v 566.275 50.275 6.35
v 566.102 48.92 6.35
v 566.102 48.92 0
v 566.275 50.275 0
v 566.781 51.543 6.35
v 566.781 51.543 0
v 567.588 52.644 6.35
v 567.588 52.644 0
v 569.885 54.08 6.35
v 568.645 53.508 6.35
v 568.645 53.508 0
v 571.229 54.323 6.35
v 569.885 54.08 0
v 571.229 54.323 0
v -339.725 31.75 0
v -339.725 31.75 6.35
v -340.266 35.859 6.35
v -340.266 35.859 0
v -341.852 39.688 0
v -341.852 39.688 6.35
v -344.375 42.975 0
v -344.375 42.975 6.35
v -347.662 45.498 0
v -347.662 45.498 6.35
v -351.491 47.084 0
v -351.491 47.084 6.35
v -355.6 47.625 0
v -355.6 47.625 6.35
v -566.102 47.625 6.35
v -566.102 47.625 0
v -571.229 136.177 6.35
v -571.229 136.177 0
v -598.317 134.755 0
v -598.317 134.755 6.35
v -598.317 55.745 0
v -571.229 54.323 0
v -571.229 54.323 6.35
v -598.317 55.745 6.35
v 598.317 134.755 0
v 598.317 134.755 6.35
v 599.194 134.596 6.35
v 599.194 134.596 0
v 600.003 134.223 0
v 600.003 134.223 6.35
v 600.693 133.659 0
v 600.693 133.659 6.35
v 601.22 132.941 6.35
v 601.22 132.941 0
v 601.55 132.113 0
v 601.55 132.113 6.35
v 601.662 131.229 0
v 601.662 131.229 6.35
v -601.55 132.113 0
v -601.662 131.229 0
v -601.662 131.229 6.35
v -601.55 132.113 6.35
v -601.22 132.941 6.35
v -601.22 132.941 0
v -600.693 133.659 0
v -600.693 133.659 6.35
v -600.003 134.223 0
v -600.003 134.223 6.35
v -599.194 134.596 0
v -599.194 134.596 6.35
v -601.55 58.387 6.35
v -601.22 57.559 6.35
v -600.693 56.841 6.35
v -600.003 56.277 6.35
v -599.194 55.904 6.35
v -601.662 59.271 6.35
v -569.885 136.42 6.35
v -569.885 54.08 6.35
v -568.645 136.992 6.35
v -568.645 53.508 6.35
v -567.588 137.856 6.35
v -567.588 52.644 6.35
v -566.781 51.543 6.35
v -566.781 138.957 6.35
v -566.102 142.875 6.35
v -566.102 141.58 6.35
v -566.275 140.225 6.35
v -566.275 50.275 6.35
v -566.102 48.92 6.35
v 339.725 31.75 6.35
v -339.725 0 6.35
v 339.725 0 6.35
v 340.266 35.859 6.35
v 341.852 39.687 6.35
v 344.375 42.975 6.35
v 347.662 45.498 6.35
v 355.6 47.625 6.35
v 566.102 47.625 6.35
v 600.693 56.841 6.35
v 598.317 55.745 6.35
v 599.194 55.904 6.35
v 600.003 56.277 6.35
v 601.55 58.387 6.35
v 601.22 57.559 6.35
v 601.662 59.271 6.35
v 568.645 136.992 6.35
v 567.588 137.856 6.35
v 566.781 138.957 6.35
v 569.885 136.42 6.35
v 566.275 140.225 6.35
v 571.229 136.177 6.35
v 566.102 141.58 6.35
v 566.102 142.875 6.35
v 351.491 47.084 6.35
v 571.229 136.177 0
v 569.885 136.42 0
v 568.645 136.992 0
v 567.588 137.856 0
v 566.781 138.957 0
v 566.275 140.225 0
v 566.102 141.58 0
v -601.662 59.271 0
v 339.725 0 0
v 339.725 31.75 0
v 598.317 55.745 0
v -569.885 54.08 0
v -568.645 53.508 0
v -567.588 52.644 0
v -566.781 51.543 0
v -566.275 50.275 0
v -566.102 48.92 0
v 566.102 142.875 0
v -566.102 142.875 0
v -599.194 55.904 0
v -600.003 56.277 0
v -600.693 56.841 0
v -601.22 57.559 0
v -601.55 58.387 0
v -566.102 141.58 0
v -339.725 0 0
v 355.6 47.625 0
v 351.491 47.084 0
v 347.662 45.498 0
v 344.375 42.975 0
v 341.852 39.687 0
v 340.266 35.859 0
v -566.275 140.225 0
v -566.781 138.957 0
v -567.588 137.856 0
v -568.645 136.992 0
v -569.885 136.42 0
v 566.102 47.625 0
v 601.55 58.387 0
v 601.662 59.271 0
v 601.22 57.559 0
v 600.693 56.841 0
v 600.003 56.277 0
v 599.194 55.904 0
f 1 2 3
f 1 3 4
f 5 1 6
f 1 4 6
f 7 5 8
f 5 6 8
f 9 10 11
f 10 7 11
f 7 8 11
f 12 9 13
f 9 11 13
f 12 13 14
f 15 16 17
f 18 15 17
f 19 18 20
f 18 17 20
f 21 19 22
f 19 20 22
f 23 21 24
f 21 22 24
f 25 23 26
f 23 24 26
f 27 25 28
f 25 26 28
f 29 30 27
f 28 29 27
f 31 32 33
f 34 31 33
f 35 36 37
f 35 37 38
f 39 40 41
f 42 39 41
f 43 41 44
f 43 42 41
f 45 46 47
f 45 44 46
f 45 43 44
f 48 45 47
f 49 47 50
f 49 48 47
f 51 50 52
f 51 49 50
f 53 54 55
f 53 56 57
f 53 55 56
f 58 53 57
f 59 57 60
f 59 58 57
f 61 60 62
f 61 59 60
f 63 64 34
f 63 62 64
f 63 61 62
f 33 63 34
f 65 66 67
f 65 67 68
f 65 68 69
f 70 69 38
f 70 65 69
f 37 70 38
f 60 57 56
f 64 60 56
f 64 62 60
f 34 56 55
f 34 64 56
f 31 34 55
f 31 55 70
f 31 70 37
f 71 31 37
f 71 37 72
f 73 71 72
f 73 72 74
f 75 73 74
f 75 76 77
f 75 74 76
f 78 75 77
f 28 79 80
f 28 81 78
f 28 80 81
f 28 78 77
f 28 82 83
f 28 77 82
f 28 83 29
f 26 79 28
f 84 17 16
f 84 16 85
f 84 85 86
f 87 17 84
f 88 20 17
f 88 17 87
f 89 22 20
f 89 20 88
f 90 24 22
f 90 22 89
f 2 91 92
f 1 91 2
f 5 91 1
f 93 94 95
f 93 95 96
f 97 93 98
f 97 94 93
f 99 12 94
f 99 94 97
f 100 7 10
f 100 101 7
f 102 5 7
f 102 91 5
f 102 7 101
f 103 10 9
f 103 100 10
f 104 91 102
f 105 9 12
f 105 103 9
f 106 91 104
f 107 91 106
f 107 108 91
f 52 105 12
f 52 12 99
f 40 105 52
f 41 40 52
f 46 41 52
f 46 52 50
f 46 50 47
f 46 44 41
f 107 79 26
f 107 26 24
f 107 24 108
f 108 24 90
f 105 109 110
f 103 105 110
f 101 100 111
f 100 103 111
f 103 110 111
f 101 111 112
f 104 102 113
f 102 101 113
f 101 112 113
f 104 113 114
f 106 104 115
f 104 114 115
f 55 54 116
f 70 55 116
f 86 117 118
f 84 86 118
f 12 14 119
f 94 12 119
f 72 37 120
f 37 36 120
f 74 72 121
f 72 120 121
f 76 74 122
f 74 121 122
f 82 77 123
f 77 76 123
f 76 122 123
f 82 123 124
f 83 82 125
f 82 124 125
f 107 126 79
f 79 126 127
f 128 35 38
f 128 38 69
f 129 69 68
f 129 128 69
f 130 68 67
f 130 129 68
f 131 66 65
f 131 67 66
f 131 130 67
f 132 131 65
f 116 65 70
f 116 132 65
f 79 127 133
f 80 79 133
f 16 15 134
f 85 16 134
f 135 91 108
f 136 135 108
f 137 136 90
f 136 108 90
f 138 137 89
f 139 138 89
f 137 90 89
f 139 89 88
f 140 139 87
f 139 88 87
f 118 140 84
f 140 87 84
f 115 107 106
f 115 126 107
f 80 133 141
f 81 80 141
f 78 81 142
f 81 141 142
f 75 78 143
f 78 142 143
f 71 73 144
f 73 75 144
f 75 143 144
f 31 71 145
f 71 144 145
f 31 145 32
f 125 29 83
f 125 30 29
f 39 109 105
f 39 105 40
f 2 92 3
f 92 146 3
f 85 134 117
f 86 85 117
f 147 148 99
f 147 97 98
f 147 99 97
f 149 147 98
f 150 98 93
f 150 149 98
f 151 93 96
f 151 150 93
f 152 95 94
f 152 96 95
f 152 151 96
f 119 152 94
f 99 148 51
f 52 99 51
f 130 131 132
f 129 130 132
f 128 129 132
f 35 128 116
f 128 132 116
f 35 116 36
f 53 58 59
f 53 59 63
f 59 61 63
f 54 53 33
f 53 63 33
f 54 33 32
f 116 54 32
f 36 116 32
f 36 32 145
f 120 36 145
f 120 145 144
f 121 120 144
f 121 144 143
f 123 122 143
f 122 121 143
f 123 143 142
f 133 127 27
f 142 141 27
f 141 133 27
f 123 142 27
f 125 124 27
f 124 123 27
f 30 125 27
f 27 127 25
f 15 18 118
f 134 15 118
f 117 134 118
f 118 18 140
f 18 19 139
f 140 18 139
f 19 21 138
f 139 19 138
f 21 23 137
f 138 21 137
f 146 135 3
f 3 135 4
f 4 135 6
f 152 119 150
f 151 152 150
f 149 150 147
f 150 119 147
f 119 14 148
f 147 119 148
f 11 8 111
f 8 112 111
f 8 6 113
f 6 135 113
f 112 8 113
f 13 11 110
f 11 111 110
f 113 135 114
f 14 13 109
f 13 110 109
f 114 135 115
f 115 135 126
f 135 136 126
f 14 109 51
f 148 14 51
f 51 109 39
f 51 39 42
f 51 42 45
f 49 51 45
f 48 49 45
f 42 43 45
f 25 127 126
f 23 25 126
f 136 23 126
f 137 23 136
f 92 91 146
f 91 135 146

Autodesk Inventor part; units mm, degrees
ref_plane "YZ Plane" through (0, 0, 0) normal (1, 0, 0) x (0, 1, 0)
ref_plane "XZ Plane" through (0, 0, 0) normal (0, 1, 0) x (-1, 0, 0)
ref_plane "XY Plane" through (0, 0, 0) normal (0, 0, 1) x (1, 0, 0)
sketch "Sketch1" plane through (0, 0, 0) normal (0, 0, 1) x (1, 0, 0)
  line L0 (-339.725, 0) -> (339.725, 0)
  line L1 (339.725, 0) -> (339.725, 47.625)
  line L2 (339.725, 47.625) -> (566.1025, 47.625)
  line L3 (601.6625, 59.2709) -> (601.6625, 131.2291)
  line L4 (566.1025, 142.875) -> (-566.1025, 142.875)
  line L5 (-601.6625, 131.2291) -> (-601.6625, 59.2709)
  line L6 (-566.1025, 47.625) -> (-339.725, 47.625)
  line L7 (-339.725, 47.625) -> (-339.725, 0)
  line L8 (566.1025, 47.625) -> (566.1025, 48.9204)
  arc A0 (571.2291, 54.3232) -> (566.1025, 48.9204) centre (571.5127, 48.9204) ccw
  line L9 (571.2291, 54.3232) -> (598.317, 55.7452)
  arc A1 (598.317, 55.7452) -> (601.6625, 59.2709) centre (598.1319, 59.2709) ccw
  line L10 (566.1025, 142.875) -> (566.1025, 141.5796)
  arc A2 (566.1025, 141.5796) -> (571.2291, 136.1768) centre (571.5127, 141.5796) ccw
  line L11 (571.2291, 136.1768) -> (598.317, 134.7548)
  arc A3 (601.6625, 131.2291) -> (598.317, 134.7548) centre (598.1319, 131.2291) ccw
  line L12 (-566.1025, 142.875) -> (-566.1025, 141.5796)
  arc A4 (-571.2291, 136.1768) -> (-566.1025, 141.5796) centre (-571.5127, 141.5796) ccw
  line L13 (-571.2291, 136.1768) -> (-598.317, 134.7548)
  arc A5 (-598.317, 134.7548) -> (-601.6625, 131.2291) centre (-598.1319, 131.2291) ccw
  line L14 (-566.1025, 47.625) -> (-566.1025, 48.9204)
  arc A6 (-566.1025, 48.9204) -> (-571.2291, 54.3232) centre (-571.5127, 48.9204) ccw
  line L15 (-571.2291, 54.3232) -> (-598.317, 55.7452)
  arc A7 (-601.6625, 59.2709) -> (-598.317, 55.7452) centre (-598.1319, 59.2709) ccw
  point P0 (0, 0)
  point P1 (0, 0)
  dimension "d0" = 679.45
  dimension "d1" = 1203.325
  dimension "d2" = 47.625
  dimension "d3" = 95.25
  dimension "d4" = 71.9582
  dimension "d8" = 3.5306
  dimension "d9" = 5.4102
  dimension "d10" = 35.56
  dimension "d11" = 1.2954
extrude "Extrusion1" add sketch "Sketch1" along normal blind 6.35
fillet "Fillet1" radius 15.875 2 edges at (-339.725, 47.625, 3.175) (339.725, 47.625, 3.175)
properties part number "A1-18002-100-40 Pocket door plate" material "Steel, Mild"
